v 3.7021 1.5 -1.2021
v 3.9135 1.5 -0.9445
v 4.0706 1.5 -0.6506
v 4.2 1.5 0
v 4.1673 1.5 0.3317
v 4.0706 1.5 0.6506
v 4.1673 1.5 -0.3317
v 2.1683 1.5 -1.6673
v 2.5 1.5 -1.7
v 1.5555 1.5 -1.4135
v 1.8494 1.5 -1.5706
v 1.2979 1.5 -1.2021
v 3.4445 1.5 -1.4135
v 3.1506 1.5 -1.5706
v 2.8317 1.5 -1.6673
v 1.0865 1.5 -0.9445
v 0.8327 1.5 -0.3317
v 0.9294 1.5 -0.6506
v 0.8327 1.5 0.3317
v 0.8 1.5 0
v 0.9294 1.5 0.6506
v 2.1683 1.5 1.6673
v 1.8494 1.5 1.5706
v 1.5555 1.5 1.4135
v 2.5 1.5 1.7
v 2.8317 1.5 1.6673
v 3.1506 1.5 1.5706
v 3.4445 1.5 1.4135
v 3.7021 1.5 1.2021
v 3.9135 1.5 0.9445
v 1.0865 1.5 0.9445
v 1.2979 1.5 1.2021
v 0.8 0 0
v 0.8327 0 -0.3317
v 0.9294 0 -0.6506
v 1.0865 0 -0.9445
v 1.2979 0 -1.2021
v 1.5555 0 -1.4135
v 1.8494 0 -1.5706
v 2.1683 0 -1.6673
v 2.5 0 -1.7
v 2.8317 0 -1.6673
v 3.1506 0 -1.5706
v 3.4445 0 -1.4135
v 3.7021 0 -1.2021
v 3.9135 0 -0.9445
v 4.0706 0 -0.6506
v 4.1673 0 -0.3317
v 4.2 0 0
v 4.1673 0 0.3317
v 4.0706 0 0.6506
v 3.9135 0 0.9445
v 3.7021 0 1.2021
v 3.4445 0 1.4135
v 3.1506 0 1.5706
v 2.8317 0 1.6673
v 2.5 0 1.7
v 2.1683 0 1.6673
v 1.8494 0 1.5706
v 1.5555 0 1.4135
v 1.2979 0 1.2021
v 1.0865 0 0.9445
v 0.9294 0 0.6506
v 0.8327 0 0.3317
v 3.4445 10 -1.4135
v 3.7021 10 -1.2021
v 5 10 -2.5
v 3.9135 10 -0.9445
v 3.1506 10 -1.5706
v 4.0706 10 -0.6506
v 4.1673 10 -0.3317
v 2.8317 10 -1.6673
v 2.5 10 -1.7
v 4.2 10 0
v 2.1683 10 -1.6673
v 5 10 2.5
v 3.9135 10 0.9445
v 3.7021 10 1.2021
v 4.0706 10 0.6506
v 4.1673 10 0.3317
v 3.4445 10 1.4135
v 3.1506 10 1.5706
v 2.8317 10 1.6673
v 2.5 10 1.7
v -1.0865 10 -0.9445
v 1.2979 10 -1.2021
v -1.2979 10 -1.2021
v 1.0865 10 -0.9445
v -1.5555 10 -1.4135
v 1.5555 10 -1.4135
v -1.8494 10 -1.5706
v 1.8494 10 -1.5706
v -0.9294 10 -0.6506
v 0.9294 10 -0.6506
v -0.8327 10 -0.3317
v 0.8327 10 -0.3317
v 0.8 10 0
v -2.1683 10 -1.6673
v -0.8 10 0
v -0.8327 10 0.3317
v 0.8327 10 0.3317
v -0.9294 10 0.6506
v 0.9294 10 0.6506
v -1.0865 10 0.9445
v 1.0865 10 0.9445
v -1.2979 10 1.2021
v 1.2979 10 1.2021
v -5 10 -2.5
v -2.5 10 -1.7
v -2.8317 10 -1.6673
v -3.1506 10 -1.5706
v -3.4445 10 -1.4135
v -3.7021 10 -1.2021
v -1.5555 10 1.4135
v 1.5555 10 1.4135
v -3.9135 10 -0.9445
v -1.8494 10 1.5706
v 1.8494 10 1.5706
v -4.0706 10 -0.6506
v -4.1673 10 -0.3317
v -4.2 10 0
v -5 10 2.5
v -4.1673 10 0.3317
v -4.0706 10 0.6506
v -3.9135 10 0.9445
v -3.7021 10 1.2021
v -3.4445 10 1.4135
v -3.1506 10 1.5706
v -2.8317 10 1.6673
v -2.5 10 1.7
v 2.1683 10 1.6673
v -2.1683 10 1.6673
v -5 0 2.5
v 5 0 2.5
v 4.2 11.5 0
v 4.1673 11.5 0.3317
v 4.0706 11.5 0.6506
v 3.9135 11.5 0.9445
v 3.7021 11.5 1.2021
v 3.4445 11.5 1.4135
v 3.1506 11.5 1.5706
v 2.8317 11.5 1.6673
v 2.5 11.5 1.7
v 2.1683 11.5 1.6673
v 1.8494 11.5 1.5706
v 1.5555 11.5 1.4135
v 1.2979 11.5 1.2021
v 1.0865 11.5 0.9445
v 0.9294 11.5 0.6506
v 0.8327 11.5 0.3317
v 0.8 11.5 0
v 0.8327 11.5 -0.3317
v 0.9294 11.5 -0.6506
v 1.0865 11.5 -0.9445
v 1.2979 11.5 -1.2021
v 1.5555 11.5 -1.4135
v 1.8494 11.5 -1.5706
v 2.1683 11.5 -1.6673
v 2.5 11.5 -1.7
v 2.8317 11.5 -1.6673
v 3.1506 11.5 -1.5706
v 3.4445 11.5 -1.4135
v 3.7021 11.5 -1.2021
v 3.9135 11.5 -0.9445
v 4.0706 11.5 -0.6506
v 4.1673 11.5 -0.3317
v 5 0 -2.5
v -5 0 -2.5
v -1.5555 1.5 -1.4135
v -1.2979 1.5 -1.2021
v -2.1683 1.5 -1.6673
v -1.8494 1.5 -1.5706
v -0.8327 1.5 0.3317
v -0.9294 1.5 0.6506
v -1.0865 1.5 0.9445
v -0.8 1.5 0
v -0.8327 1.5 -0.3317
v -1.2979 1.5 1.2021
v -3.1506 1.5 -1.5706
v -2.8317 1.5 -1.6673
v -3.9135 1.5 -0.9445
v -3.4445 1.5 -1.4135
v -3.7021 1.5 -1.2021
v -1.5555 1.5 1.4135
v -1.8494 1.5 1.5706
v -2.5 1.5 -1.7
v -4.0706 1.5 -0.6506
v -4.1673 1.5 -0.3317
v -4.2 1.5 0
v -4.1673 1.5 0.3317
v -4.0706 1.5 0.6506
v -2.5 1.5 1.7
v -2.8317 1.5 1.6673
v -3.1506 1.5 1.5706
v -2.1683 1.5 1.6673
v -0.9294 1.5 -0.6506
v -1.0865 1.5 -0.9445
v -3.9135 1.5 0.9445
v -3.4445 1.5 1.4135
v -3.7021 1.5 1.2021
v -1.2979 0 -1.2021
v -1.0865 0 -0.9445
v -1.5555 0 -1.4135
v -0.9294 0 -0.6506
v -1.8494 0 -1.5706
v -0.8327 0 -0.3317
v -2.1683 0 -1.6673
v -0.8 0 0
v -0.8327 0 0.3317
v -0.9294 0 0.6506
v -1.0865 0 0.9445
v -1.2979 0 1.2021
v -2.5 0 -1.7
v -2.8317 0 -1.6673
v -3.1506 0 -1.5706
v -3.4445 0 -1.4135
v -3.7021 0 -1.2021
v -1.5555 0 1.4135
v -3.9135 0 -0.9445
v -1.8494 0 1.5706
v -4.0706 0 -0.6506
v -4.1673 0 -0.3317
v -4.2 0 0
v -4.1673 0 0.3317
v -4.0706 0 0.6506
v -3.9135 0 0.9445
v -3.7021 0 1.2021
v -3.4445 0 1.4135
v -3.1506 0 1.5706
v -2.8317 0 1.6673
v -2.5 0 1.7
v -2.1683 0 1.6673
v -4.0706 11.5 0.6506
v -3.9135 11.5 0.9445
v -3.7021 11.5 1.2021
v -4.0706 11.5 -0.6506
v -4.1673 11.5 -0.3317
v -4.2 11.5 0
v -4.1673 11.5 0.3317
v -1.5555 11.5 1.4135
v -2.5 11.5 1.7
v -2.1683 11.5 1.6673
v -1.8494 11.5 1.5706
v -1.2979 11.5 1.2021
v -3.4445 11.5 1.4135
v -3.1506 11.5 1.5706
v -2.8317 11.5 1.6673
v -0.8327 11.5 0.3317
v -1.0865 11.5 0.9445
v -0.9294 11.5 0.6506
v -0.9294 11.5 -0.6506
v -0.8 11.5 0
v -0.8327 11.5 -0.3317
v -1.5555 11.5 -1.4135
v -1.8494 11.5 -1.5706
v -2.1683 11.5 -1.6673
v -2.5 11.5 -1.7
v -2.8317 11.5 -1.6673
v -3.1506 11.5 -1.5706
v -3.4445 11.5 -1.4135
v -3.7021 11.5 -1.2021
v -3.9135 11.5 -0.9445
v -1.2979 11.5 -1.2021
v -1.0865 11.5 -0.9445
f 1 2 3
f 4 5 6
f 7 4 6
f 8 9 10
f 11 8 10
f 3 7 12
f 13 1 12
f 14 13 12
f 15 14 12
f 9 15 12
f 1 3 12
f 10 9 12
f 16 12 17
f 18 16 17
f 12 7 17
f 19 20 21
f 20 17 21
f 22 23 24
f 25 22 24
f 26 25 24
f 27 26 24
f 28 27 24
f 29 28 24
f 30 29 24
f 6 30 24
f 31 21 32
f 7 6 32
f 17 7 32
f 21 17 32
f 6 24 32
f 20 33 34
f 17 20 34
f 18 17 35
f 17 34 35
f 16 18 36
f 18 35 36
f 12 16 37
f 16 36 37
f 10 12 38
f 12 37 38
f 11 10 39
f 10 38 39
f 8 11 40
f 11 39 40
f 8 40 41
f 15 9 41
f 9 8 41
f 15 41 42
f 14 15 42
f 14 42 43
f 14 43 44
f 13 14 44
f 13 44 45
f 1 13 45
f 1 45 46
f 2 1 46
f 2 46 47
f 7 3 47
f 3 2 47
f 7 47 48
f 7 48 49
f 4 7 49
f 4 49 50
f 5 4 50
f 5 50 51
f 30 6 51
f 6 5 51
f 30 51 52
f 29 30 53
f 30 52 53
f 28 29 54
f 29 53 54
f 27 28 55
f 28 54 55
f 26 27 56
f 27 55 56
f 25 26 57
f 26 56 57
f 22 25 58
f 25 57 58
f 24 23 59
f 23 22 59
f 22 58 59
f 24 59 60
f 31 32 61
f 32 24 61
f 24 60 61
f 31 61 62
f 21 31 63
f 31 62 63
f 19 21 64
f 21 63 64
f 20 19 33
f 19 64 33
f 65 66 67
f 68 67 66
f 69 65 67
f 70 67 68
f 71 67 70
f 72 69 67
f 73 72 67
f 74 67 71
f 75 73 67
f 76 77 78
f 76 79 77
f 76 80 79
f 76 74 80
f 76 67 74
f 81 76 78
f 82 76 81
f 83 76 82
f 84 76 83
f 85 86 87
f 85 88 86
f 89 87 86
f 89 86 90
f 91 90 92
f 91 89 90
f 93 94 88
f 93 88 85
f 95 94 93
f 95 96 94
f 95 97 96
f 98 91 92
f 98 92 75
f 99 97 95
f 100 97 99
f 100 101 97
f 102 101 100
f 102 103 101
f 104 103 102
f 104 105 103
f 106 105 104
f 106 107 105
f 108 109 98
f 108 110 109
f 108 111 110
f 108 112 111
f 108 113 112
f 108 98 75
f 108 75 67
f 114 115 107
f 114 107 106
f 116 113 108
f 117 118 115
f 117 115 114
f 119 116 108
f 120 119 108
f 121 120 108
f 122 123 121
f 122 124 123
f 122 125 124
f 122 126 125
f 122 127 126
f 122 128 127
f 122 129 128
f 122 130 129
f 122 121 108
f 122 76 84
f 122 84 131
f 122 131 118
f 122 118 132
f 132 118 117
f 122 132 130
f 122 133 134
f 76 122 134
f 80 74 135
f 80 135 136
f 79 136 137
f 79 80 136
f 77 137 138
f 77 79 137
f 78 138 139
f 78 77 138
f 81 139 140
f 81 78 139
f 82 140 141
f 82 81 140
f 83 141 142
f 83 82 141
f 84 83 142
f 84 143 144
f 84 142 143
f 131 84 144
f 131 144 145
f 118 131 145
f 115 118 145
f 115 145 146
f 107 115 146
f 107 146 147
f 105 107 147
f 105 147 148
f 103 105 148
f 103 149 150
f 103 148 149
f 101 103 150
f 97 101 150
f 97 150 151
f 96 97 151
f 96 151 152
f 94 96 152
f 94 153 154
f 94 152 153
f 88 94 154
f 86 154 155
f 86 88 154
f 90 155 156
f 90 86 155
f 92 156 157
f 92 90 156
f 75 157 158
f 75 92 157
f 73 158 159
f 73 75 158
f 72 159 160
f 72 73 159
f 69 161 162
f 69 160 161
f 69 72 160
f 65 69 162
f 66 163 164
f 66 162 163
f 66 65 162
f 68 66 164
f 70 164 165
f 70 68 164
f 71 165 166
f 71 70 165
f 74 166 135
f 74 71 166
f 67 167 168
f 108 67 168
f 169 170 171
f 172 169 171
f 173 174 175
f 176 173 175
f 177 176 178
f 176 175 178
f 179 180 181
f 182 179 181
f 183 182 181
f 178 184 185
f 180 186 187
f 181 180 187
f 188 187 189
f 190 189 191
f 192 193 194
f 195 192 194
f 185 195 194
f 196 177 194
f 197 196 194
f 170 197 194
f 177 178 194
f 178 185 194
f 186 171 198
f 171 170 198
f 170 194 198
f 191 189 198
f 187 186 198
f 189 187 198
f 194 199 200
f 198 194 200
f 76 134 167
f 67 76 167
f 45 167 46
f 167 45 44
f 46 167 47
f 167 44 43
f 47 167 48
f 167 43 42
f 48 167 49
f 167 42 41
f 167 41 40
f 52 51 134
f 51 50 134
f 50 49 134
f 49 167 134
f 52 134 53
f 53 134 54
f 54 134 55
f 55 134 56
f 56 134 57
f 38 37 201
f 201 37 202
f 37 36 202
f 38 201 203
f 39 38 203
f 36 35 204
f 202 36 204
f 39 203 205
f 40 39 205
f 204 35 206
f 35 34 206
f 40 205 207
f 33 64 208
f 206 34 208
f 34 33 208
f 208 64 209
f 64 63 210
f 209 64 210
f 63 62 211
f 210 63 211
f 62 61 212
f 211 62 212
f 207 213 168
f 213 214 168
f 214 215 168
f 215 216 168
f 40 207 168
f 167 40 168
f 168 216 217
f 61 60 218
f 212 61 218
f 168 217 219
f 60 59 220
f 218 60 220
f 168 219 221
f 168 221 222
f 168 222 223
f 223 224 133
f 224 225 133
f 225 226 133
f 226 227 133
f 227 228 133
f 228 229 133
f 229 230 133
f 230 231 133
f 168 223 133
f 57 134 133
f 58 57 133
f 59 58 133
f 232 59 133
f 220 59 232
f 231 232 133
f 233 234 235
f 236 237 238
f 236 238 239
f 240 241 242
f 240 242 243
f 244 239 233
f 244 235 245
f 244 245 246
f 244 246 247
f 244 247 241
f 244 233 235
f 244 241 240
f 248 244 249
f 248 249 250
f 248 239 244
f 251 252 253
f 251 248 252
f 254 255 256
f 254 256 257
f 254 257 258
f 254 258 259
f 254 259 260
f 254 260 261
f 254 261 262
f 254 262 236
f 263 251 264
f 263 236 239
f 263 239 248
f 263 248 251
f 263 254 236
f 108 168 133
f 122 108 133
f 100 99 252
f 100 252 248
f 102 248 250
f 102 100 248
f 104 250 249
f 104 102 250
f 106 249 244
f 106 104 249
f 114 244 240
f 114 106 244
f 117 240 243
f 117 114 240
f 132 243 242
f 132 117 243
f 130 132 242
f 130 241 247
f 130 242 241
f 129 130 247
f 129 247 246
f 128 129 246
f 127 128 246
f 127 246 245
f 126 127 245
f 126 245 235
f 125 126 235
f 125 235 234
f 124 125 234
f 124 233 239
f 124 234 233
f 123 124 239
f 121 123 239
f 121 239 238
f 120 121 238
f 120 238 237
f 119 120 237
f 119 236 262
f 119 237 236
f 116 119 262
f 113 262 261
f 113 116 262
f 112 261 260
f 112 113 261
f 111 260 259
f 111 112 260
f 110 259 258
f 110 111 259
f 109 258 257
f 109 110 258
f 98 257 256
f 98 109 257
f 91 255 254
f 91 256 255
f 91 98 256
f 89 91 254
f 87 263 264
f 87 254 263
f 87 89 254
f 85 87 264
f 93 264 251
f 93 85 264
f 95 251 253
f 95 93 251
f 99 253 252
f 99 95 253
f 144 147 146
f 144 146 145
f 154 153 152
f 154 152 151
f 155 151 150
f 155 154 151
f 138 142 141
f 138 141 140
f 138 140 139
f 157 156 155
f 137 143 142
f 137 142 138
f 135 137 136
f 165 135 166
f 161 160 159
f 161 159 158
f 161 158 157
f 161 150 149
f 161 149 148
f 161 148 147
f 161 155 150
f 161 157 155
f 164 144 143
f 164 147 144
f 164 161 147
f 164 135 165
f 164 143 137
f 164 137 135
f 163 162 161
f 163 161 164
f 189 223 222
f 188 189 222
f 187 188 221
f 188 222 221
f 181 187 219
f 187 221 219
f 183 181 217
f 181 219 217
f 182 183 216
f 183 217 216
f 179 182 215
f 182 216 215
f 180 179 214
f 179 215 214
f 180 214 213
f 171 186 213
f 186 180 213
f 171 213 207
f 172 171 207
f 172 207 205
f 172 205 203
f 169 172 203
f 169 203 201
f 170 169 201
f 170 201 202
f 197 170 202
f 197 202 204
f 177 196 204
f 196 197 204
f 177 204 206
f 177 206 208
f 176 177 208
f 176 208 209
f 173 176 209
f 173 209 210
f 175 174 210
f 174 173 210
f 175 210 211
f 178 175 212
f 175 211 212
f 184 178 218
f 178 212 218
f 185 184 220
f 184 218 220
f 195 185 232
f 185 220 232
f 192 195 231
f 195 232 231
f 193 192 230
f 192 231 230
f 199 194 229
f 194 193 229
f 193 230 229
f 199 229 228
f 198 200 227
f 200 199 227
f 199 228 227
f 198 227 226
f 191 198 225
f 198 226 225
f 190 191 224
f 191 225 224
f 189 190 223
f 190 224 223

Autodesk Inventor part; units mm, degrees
ref_plane "YZ Plane" through (0, 0, 0) normal (1, 0, 0) x (0, 1, 0)
ref_plane "XZ Plane" through (0, 0, 0) normal (0, 1, 0) x (-1, 0, 0)
ref_plane "XY Plane" through (0, 0, 0) normal (0, 0, 1) x (1, 0, 0)
sketch "草圖2" plane through (0, 0, 0) normal (0, 1, 0) x (-1, 0, 0)
  line L0 (5, 2.5) -> (-5, 2.5)
  line L1 (-5, 2.5) -> (-5, -2.5)
  line L2 (-5, -2.5) -> (5, -2.5)
  line L3 (5, -2.5) -> (5, 2.5)
  circle A0 centre (2.5, 0) radius 1.7
  circle A1 centre (-2.5, 0) radius 1.7
  point P0 (0, 0)
  point P1 (5, 0)
  point P2 (0, -2.5)
  dimension "d0" = 10
  dimension "d1" = 5
  dimension "d2" = 3.4
  dimension "d3" = 2.5
  dimension "d4" = 2.5
  dimension "d7" = 5
extrude "擠出1" add sketch "草圖2" along normal blind 10 contours L3 L2 L1 L0 | A0 | A1
extrude "擠出2" cut sketch "草圖2" along normal blind 1.5 contours A0 | A1
sketch "草圖3" plane through (0, 10, 0) normal (0, 1, 0) x (1, 0, 0)
  circle A0 centre (-2.5, 0) radius 1.7 projected
  circle A1 centre (2.5, 0) radius 1.7 projected
  point P0 (0, 0)
extrude "擠出3" add sketch "草圖3" along normal blind 1.5
sketch "草圖4" plane through (0, 0, 0) normal (0, 0, 1) x (1, 0, 0)
  line L0 (5, 10) -> (5, 0) projected
  line L1 (5, 0) -> (4.2, 0) projected
  line L2 (4.2, 0) -> (4.2, 1.5) projected
  line L3 (4.2, 1.5) -> (0.8, 1.5) projected
  line L4 (0.8, 1.5) -> (0.8, 0) projected
  line L5 (0.8, 0) -> (-0.8, 0) projected
  line L6 (-0.8, 0) -> (-0.8, 1.5) projected
  line L7 (-0.8, 1.5) -> (-4.2, 1.5) projected
  line L8 (-4.2, 1.5) -> (-4.2, 0) projected
  line L9 (-4.2, 0) -> (-5, 0) projected
  line L10 (-5, 0) -> (-5, 10) projected
  line L11 (-5, 10) -> (-4.2, 10) projected
  line L12 (-4.2, 10) -> (-4.2, 11.5) projected
  line L13 (-4.2, 11.5) -> (-0.8, 11.5) projected
  line L14 (-0.8, 11.5) -> (-0.8, 10) projected
  line L15 (-0.8, 10) -> (0.8, 10) projected
  line L16 (0.8, 10) -> (0.8, 11.5) projected
  line L17 (0.8, 11.5) -> (4.2, 11.5) projected
  line L18 (4.2, 11.5) -> (4.2, 10) projected
  line L19 (4.2, 10) -> (5, 10) projected
  line L20 (-3, 8) -> (3, 8)
  line L21 (3, 8) -> (3, 2)
  line L22 (3, 2) -> (-3, 2)
  line L23 (-3, 2) -> (-3, 8)
  line L24 (0, 10) -> (0, 0) construction
  line L25 (5, 0) -> (-5, 0) construction
  point P0 (0, 8)
  point P1 (3, 5)
  point P2 (5, 5)
  dimension "d18" = 6
  dimension "d19" = 6
split_face "分割1"
properties part number "110033226_ipt_22_塔樓牆壁"
